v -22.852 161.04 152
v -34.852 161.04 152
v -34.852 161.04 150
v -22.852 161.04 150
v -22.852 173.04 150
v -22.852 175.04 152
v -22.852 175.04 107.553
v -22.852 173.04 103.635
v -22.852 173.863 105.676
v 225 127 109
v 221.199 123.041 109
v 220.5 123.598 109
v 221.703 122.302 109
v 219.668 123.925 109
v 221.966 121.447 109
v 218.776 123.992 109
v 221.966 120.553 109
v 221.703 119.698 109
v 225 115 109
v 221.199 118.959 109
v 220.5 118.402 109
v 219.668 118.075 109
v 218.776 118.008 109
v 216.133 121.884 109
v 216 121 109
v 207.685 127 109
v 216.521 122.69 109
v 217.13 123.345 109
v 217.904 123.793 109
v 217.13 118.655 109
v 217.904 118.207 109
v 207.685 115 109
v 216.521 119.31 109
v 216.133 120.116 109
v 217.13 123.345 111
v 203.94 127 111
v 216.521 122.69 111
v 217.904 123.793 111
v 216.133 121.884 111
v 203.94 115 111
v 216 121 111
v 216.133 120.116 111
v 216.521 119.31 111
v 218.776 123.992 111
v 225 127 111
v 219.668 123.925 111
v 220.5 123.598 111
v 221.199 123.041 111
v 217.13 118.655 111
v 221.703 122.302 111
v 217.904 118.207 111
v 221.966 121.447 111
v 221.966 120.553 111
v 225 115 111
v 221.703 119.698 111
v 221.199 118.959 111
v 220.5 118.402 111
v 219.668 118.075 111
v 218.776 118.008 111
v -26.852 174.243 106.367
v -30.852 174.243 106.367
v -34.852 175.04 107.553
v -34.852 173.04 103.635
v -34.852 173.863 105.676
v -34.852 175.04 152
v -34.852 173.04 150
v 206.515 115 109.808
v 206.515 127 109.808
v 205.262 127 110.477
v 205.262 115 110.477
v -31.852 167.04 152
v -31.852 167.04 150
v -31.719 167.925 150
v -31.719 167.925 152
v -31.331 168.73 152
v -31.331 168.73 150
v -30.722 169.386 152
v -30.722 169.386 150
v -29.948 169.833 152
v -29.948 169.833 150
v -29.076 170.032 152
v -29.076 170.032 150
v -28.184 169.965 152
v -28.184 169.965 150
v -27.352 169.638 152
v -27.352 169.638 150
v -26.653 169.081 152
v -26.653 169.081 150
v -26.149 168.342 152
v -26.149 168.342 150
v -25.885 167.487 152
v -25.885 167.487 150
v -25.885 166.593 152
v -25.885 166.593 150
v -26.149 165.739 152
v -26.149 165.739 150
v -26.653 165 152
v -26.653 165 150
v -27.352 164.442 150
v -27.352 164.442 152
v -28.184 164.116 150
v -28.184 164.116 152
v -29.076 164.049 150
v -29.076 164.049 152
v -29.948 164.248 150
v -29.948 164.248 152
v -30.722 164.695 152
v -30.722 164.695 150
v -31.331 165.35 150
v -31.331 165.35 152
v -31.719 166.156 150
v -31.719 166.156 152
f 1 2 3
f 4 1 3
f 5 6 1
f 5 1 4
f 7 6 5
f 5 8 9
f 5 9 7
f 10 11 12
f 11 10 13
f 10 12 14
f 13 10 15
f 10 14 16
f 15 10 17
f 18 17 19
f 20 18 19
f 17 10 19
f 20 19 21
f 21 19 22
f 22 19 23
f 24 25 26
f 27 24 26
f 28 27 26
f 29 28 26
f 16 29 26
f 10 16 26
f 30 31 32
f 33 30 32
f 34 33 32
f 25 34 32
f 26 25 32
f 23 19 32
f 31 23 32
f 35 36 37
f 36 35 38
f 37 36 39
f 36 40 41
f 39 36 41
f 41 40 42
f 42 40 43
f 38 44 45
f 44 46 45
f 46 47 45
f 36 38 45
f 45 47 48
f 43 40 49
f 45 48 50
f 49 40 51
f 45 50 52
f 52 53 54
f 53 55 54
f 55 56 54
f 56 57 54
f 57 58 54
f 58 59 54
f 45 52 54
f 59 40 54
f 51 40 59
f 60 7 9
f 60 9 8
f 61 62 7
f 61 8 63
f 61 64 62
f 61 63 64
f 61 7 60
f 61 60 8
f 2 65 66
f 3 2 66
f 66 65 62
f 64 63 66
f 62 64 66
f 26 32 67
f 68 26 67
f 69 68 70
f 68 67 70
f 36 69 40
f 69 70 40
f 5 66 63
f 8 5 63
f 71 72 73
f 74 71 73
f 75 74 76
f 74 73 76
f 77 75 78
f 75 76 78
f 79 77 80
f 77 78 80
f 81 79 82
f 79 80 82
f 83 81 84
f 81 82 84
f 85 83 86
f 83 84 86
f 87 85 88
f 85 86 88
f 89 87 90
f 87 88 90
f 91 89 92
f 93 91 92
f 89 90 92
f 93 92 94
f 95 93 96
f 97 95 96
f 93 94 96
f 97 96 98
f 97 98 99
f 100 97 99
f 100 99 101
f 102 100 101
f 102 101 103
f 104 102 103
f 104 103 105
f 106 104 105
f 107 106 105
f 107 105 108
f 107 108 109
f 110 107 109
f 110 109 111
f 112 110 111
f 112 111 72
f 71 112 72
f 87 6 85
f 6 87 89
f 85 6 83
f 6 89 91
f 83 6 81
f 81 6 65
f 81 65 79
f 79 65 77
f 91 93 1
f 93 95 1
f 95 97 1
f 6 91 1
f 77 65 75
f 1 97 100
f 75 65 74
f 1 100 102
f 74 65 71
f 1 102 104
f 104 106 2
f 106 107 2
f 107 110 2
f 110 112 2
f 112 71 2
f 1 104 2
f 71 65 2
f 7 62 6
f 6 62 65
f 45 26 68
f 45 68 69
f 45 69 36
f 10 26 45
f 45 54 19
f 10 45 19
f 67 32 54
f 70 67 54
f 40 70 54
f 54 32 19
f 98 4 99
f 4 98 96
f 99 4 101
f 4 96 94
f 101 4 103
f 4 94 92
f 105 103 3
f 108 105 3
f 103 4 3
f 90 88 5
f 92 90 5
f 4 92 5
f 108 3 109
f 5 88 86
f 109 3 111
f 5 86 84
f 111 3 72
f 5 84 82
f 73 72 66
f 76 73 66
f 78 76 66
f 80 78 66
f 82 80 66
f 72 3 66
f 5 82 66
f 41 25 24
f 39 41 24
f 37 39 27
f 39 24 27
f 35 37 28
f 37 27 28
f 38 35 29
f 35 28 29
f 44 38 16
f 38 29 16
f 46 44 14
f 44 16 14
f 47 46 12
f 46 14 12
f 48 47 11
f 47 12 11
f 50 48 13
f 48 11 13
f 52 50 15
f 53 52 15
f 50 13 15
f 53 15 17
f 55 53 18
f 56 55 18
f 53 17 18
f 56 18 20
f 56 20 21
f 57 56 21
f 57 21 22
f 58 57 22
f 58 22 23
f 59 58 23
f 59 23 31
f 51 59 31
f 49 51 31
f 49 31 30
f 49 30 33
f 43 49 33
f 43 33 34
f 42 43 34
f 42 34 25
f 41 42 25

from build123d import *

# Parameters (mm, degrees)
DODANIE_WYCI_GNI_CIE2_DEPTH = 12
SZKIC3_R                    = 3
WYTNIJ_WYCI_GNI_CIE1_DEPTH  = 15
DODANIE_WYCI_GNI_CIE3_DEPTH = 12
SZKIC5_R                    = 3
WYTNIJ_WYCI_GNI_CIE2_DEPTH  = 12


with BuildPart() as part:
    # Szkic2 → Dodanie-wyciągnięcie2 (new body)
    with BuildSketch(Plane(origin=(0, 115, 0), x_dir=(-1, 0, 0), z_dir=(0, -1, 0))):
        with BuildLine():
            Line((-203.939898073, -111), (-225, -111))
            Line((-225, -111), (-225, -109))
            Line((-225, -109), (-207.685108725, -109))
            ThreePointArc((-207.685108725, -109), (-205.89804018, -110.160176633), (-203.939898073, -111))
        make_face()
    extrude(amount=-DODANIE_WYCI_GNI_CIE2_DEPTH)

    # Szkic3 → Wytnij-wyciągnięcie1 (cut)
    with BuildSketch(Plane(origin=(0, 0, 109), x_dir=(-1, 0, 0), z_dir=(0, 0, -1))):
        with Locations((-219, 121)):
            Circle(SZKIC3_R)
    extrude(amount=-WYTNIJ_WYCI_GNI_CIE1_DEPTH, mode=Mode.SUBTRACT)


with BuildPart() as body_2:
    # Szkic4 → Dodanie-wyciągnięcie3 (new body)
    with BuildSketch(Plane.ZY.offset(34.851954913)):
        with BuildLine():
            Line((107.553462494, 175.040321072), (152, 175.040321072))
            Line((152, 175.040321072), (152, 161.040321072))
            Line((152, 161.040321072), (150, 161.040321072))
            Line((150, 161.040321072), (150, 173.040321072))
            Line((150, 173.040321072), (103.63539268, 173.040321072))
            add(Edge.make_bspline(
                [(107.553462494, 175.040321072), (106.389921068, 174.157886349), (105.07331599, 173.477407712), (103.63539268, 173.040321072)],
                knots=[0.165921967, 0.165921967, 0.165921967, 0.165921967, 0.212843005, 0.212843005, 0.212843005, 0.212843005], degree=3, weights=[0.556552925, 0.535512773, 0.52034351, 0.511045138]))
        make_face()
    extrude(amount=-DODANIE_WYCI_GNI_CIE3_DEPTH)

    # Szkic5 → Wytnij-wyciągnięcie2 (cut)
    with BuildSketch(Plane(origin=(0, 0, 150), x_dir=(-1, 0, 0), z_dir=(0, 0, -1))):
        with Locations((28.851954913, 167.040321072)):
            Circle(SZKIC5_R)
    extrude(amount=-WYTNIJ_WYCI_GNI_CIE2_DEPTH, mode=Mode.SUBTRACT)


solid = Compound([part.part, body_2.part])
